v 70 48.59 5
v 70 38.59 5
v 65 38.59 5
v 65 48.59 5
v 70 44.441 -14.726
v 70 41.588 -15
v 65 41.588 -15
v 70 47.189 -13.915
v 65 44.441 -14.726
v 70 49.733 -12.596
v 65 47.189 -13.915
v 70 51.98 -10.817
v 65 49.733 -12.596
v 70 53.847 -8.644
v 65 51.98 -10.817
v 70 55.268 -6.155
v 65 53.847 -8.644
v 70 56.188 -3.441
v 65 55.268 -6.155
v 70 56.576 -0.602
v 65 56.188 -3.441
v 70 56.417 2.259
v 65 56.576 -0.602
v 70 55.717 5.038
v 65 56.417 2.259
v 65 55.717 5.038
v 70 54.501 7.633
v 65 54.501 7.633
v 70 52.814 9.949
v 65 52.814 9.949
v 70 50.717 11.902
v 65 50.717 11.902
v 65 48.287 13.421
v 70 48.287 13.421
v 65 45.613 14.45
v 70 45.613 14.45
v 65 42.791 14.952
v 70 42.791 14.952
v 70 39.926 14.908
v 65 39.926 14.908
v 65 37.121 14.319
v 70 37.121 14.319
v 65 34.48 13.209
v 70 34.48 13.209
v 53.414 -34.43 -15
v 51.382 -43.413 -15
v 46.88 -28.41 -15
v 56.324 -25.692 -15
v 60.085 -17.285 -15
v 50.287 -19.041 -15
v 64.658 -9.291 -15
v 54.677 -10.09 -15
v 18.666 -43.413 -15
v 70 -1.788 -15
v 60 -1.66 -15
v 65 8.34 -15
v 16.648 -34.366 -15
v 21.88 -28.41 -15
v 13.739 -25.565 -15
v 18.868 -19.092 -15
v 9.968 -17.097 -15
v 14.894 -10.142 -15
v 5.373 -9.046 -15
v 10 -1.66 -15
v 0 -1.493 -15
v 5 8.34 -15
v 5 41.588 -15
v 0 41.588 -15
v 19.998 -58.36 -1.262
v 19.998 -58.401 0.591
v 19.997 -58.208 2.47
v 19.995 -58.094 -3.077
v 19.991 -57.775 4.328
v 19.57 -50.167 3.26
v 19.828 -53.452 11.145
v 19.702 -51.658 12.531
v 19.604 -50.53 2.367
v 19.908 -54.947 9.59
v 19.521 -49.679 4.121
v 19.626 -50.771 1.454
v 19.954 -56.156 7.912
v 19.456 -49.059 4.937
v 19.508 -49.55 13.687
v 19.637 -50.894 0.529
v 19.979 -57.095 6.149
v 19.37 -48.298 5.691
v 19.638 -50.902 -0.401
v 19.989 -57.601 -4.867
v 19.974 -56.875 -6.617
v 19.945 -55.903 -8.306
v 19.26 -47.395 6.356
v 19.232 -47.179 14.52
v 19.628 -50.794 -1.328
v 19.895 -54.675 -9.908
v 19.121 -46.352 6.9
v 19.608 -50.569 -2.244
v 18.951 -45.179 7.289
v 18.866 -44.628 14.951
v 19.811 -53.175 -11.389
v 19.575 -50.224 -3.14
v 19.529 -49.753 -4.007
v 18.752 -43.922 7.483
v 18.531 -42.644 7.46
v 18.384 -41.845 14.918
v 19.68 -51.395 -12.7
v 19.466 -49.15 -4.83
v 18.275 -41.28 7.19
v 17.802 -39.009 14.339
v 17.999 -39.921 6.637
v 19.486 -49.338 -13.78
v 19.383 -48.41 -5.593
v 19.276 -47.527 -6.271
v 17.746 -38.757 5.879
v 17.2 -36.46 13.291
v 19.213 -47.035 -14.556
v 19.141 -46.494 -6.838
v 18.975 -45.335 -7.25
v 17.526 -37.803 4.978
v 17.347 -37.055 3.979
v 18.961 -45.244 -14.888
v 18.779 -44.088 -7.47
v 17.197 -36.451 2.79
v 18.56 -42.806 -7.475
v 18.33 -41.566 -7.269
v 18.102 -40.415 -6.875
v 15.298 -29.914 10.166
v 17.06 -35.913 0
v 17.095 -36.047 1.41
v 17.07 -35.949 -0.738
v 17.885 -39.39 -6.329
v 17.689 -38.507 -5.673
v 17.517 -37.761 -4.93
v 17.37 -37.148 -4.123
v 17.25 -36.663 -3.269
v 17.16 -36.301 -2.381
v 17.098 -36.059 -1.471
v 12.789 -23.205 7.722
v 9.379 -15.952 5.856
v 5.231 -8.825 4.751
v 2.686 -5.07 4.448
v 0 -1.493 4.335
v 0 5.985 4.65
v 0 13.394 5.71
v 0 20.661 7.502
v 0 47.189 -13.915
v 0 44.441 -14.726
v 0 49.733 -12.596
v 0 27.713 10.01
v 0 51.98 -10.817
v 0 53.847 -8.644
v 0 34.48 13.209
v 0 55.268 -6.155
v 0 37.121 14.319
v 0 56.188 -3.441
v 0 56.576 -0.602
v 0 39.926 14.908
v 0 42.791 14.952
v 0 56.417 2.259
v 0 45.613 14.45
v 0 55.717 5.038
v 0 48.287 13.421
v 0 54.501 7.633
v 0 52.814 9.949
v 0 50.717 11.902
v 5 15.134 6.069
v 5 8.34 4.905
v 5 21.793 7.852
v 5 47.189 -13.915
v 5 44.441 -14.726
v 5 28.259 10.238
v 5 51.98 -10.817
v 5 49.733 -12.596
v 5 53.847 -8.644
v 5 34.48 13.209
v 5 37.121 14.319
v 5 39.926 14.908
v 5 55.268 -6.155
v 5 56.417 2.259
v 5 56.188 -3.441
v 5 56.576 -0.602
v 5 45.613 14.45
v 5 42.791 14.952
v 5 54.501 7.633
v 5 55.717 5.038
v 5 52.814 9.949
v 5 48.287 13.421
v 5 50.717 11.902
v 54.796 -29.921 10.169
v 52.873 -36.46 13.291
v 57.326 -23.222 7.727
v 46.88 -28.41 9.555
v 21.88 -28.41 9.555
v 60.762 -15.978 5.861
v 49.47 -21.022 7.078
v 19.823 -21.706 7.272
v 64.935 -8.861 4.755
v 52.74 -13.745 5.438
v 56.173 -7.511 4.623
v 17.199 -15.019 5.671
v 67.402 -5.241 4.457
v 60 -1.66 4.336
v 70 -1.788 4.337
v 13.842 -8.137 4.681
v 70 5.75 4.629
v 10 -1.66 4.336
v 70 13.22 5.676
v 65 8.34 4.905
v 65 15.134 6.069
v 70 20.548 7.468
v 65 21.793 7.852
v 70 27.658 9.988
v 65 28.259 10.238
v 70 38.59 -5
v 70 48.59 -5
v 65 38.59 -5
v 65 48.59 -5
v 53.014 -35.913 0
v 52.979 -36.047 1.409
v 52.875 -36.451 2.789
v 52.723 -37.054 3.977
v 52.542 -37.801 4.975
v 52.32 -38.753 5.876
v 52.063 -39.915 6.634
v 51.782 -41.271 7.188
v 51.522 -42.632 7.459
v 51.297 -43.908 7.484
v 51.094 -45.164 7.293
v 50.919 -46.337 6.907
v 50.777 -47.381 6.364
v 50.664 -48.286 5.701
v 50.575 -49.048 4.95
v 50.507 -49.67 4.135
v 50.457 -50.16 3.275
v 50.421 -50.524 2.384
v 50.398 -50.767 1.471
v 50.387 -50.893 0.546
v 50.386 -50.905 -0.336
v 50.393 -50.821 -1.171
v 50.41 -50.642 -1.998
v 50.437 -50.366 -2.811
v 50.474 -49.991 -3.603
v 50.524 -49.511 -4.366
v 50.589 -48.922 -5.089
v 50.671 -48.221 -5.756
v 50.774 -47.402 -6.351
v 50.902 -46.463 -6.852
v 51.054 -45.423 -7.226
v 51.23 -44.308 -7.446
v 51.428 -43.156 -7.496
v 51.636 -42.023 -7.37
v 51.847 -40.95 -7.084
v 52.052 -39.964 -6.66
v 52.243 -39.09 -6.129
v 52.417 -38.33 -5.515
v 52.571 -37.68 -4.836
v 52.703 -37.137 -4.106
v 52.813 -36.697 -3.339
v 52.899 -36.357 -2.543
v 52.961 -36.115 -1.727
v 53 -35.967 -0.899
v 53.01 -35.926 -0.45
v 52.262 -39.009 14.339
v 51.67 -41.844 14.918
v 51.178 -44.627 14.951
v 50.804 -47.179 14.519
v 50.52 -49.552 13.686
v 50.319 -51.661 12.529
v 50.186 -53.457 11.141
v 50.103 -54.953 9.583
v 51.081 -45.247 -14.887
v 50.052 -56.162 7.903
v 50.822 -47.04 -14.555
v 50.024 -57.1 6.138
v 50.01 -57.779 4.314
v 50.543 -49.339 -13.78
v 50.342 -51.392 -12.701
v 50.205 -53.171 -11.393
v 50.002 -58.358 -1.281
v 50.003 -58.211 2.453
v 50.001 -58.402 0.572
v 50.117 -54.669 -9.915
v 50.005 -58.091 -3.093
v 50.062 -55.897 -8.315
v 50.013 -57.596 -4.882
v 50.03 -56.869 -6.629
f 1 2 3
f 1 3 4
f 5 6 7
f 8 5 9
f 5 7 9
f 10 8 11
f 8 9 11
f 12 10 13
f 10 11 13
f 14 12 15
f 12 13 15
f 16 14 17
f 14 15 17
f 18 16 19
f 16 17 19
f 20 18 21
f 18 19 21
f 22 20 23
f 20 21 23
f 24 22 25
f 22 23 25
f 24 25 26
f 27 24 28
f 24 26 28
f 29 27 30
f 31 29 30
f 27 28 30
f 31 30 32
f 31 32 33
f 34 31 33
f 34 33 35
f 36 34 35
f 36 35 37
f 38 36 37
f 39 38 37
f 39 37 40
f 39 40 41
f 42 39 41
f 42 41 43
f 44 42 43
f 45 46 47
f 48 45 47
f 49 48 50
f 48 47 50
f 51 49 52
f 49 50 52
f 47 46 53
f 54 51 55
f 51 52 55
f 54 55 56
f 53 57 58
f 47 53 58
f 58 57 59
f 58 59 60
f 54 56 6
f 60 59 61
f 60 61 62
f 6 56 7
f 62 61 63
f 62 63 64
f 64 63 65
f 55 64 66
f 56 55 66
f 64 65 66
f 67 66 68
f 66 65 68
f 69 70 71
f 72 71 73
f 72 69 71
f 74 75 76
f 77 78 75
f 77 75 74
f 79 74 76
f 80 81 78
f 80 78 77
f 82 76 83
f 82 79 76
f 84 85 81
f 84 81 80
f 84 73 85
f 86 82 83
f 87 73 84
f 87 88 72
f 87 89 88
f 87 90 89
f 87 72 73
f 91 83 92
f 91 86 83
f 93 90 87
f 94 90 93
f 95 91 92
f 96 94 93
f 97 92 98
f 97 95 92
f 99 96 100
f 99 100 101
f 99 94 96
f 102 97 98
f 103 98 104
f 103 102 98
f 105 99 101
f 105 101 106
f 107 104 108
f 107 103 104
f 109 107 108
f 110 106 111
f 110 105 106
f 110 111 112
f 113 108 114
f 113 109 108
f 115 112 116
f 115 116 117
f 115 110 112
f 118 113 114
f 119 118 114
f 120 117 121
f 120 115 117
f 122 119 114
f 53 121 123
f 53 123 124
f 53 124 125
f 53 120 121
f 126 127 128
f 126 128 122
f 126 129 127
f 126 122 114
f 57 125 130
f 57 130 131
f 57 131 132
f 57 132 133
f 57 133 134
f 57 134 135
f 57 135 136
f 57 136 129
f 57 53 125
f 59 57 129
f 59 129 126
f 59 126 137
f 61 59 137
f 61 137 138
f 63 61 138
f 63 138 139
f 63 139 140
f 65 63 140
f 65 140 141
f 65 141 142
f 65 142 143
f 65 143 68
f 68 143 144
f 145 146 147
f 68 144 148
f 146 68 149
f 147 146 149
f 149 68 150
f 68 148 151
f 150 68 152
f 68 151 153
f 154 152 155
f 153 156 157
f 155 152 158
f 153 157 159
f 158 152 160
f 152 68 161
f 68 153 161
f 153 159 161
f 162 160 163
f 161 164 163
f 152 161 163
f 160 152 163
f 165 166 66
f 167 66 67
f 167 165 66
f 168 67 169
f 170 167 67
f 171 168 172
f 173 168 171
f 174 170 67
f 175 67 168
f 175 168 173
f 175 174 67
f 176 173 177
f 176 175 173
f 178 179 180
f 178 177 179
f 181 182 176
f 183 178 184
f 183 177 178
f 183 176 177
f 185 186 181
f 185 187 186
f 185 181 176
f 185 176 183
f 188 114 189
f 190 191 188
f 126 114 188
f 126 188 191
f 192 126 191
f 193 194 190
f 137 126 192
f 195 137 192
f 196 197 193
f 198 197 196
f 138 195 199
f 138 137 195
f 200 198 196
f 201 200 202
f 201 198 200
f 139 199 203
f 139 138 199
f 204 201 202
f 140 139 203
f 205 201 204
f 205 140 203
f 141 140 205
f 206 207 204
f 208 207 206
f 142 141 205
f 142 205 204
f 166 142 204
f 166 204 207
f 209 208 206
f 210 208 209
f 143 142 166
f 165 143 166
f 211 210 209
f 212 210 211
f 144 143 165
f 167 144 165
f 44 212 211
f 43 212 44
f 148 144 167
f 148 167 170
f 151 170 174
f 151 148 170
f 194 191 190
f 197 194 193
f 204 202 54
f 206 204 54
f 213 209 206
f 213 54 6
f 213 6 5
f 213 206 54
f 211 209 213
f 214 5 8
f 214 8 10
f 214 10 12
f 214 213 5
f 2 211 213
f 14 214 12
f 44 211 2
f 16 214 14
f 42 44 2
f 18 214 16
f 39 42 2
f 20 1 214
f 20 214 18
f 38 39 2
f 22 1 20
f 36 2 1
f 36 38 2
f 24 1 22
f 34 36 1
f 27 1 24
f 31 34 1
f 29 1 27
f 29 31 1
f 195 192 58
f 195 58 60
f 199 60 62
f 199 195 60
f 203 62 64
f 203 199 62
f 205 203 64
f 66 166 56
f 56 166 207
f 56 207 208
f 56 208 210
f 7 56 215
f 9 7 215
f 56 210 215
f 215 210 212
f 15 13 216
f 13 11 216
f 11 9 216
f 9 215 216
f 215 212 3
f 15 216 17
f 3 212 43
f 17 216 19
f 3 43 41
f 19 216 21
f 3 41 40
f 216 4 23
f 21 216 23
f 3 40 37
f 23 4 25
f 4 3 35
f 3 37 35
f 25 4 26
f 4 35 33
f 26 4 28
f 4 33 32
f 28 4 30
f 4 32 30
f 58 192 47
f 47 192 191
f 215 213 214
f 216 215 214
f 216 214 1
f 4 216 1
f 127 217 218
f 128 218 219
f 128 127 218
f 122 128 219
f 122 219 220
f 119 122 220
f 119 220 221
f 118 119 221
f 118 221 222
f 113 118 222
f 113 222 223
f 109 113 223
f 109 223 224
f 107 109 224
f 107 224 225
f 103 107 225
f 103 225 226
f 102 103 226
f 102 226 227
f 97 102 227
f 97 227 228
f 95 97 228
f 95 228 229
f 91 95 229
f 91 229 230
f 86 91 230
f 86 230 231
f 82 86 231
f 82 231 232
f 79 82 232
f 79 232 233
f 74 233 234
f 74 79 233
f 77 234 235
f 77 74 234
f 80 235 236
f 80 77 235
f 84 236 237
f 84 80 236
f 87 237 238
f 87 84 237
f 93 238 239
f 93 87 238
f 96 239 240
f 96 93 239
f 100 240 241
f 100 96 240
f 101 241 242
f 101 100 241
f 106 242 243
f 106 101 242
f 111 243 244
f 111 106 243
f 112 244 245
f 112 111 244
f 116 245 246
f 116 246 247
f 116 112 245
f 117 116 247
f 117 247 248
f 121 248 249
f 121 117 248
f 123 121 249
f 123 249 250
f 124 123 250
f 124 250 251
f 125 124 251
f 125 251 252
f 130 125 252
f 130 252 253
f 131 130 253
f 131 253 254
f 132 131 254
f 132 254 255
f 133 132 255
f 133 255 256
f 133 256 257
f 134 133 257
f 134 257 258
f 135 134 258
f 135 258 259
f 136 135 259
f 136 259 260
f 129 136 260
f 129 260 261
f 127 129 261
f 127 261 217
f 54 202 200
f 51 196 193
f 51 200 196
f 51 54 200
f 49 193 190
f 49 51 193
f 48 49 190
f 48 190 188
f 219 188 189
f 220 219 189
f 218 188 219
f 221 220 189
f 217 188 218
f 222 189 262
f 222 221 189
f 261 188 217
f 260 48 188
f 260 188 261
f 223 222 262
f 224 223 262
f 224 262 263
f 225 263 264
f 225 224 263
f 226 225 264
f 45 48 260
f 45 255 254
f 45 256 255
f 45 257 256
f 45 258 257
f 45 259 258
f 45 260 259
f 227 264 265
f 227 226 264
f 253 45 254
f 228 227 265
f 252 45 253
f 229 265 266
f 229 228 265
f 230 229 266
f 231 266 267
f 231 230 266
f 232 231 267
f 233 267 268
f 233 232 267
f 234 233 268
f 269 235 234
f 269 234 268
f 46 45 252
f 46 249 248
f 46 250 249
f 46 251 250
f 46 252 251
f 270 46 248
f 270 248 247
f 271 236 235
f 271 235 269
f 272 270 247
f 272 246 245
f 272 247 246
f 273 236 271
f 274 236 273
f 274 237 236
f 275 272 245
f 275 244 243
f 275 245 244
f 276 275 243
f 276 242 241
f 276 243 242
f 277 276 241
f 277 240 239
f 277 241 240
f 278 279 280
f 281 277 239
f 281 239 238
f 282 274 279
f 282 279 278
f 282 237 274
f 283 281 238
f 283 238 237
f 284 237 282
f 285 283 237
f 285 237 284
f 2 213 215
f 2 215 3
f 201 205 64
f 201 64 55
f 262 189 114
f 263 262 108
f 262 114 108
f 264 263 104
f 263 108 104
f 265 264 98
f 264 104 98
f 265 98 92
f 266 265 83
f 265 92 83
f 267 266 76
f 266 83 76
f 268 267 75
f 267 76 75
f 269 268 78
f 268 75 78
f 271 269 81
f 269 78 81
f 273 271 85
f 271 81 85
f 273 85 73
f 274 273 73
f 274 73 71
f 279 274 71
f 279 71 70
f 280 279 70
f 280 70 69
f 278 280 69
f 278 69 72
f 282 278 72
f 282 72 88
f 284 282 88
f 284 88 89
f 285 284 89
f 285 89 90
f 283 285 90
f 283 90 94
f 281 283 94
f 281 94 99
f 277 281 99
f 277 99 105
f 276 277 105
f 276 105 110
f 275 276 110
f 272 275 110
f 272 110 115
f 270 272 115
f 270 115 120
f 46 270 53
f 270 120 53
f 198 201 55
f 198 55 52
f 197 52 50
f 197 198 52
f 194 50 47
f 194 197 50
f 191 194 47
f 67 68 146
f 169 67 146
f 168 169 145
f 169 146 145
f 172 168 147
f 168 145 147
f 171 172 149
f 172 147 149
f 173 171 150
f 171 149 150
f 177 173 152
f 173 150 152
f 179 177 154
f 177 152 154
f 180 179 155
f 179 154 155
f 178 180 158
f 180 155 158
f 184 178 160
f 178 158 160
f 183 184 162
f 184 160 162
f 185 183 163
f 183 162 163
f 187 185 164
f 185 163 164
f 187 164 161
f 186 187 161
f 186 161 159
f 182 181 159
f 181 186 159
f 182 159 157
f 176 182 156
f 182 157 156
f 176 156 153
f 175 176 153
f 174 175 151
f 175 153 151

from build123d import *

# Parameters (mm, degrees)
SKETCH_R        = 7.5
PAD_DEPTH       = 70
SKETCH001_W     = 60
SKETCH001_H     = 48.25
POCKET_DEPTH    = 30
POCKET001_DEPTH = 50
POCKET002_DEPTH = 50
SKETCH004_W     = 10
SKETCH004_H     = 10
POCKET003_DEPTH = 5


with BuildPart() as part:
    # Sketch → Pad (new body)
    with BuildSketch(Plane.YZ):
        with BuildLine():
            ThreePointArc((-36.4599581718, 13.2911850247), (-57.9795050803, 3.5799598665), (-43.412972048, -15))
            Line((-43.412972048, -15), (41.5884017265, -15))
            ThreePointArc((41.5884017265, -15), (56.1336656173, 3.6654186747), (34.479804051, 13.2086275283))
            ThreePointArc((-36.4599581718, 13.2911850247), (-1.0004550601, 4.3323292657), (34.479804051, 13.2086275283))
        make_face()
        with Locations((-43.4129719528, 0)):
            Circle(SKETCH_R, mode=Mode.SUBTRACT)
    extrude(amount=PAD_DEPTH)

    # Sketch001 → Pocket (cut)
    with BuildSketch(Plane.XY.offset(15)):
        with Locations((35, 32.465)):
            Rectangle(SKETCH001_W, SKETCH001_H)
    extrude(amount=-POCKET_DEPTH, mode=Mode.SUBTRACT)

    # Sketch002 → Pocket001 (cut)
    with BuildSketch(Plane(origin=(3, -0.1, -20), x_dir=(1, 0, 0), z_dir=(0, 0, 1))):
        with BuildLine():
            ThreePointArc((17, -58.6013099487), (11.7906635923, -28.3224370767), (-3, -1.3932039145))
            Line((-3, -1.3932039145), (-3, -58.6013099487))
            Line((-3, -58.6013099487), (17, -58.6013099487))
        make_face()
        with BuildLine():
            ThreePointArc((67.0222612126, -1.66), (52.2953112485, -28.3670320419), (47, -58.4021497296))
            Line((66.999998461, -58.4099956332), (47, -58.4021497296))
            Line((67.0222612126, -1.66), (66.999998461, -58.4099956332))
        make_face()
    extrude(amount=POCKET001_DEPTH, mode=Mode.SUBTRACT)

    # Sketch003 → Pocket002 (cut)
    with BuildSketch(Plane.XY.offset(20)):
        with BuildLine():
            Line((10, -1.66), (60, -1.66))
            ThreePointArc((60, -1.66), (52.3618075612, -14.5061818768), (46.88, -28.41))
            Line((21.88, -28.41), (46.88, -28.41))
            ThreePointArc((21.88, -28.41), (16.9989570858, -14.5647042924), (10, -1.66))
        make_face()
    extrude(amount=-POCKET002_DEPTH, mode=Mode.SUBTRACT)

    # Sketch004 → Pocket003 (cut)
    with BuildSketch(Plane.YZ.offset(70)):
        with Locations((43.59, 0)):
            Rectangle(SKETCH004_W, SKETCH004_H)
    extrude(amount=-POCKET003_DEPTH, mode=Mode.SUBTRACT)


solid = part.part
